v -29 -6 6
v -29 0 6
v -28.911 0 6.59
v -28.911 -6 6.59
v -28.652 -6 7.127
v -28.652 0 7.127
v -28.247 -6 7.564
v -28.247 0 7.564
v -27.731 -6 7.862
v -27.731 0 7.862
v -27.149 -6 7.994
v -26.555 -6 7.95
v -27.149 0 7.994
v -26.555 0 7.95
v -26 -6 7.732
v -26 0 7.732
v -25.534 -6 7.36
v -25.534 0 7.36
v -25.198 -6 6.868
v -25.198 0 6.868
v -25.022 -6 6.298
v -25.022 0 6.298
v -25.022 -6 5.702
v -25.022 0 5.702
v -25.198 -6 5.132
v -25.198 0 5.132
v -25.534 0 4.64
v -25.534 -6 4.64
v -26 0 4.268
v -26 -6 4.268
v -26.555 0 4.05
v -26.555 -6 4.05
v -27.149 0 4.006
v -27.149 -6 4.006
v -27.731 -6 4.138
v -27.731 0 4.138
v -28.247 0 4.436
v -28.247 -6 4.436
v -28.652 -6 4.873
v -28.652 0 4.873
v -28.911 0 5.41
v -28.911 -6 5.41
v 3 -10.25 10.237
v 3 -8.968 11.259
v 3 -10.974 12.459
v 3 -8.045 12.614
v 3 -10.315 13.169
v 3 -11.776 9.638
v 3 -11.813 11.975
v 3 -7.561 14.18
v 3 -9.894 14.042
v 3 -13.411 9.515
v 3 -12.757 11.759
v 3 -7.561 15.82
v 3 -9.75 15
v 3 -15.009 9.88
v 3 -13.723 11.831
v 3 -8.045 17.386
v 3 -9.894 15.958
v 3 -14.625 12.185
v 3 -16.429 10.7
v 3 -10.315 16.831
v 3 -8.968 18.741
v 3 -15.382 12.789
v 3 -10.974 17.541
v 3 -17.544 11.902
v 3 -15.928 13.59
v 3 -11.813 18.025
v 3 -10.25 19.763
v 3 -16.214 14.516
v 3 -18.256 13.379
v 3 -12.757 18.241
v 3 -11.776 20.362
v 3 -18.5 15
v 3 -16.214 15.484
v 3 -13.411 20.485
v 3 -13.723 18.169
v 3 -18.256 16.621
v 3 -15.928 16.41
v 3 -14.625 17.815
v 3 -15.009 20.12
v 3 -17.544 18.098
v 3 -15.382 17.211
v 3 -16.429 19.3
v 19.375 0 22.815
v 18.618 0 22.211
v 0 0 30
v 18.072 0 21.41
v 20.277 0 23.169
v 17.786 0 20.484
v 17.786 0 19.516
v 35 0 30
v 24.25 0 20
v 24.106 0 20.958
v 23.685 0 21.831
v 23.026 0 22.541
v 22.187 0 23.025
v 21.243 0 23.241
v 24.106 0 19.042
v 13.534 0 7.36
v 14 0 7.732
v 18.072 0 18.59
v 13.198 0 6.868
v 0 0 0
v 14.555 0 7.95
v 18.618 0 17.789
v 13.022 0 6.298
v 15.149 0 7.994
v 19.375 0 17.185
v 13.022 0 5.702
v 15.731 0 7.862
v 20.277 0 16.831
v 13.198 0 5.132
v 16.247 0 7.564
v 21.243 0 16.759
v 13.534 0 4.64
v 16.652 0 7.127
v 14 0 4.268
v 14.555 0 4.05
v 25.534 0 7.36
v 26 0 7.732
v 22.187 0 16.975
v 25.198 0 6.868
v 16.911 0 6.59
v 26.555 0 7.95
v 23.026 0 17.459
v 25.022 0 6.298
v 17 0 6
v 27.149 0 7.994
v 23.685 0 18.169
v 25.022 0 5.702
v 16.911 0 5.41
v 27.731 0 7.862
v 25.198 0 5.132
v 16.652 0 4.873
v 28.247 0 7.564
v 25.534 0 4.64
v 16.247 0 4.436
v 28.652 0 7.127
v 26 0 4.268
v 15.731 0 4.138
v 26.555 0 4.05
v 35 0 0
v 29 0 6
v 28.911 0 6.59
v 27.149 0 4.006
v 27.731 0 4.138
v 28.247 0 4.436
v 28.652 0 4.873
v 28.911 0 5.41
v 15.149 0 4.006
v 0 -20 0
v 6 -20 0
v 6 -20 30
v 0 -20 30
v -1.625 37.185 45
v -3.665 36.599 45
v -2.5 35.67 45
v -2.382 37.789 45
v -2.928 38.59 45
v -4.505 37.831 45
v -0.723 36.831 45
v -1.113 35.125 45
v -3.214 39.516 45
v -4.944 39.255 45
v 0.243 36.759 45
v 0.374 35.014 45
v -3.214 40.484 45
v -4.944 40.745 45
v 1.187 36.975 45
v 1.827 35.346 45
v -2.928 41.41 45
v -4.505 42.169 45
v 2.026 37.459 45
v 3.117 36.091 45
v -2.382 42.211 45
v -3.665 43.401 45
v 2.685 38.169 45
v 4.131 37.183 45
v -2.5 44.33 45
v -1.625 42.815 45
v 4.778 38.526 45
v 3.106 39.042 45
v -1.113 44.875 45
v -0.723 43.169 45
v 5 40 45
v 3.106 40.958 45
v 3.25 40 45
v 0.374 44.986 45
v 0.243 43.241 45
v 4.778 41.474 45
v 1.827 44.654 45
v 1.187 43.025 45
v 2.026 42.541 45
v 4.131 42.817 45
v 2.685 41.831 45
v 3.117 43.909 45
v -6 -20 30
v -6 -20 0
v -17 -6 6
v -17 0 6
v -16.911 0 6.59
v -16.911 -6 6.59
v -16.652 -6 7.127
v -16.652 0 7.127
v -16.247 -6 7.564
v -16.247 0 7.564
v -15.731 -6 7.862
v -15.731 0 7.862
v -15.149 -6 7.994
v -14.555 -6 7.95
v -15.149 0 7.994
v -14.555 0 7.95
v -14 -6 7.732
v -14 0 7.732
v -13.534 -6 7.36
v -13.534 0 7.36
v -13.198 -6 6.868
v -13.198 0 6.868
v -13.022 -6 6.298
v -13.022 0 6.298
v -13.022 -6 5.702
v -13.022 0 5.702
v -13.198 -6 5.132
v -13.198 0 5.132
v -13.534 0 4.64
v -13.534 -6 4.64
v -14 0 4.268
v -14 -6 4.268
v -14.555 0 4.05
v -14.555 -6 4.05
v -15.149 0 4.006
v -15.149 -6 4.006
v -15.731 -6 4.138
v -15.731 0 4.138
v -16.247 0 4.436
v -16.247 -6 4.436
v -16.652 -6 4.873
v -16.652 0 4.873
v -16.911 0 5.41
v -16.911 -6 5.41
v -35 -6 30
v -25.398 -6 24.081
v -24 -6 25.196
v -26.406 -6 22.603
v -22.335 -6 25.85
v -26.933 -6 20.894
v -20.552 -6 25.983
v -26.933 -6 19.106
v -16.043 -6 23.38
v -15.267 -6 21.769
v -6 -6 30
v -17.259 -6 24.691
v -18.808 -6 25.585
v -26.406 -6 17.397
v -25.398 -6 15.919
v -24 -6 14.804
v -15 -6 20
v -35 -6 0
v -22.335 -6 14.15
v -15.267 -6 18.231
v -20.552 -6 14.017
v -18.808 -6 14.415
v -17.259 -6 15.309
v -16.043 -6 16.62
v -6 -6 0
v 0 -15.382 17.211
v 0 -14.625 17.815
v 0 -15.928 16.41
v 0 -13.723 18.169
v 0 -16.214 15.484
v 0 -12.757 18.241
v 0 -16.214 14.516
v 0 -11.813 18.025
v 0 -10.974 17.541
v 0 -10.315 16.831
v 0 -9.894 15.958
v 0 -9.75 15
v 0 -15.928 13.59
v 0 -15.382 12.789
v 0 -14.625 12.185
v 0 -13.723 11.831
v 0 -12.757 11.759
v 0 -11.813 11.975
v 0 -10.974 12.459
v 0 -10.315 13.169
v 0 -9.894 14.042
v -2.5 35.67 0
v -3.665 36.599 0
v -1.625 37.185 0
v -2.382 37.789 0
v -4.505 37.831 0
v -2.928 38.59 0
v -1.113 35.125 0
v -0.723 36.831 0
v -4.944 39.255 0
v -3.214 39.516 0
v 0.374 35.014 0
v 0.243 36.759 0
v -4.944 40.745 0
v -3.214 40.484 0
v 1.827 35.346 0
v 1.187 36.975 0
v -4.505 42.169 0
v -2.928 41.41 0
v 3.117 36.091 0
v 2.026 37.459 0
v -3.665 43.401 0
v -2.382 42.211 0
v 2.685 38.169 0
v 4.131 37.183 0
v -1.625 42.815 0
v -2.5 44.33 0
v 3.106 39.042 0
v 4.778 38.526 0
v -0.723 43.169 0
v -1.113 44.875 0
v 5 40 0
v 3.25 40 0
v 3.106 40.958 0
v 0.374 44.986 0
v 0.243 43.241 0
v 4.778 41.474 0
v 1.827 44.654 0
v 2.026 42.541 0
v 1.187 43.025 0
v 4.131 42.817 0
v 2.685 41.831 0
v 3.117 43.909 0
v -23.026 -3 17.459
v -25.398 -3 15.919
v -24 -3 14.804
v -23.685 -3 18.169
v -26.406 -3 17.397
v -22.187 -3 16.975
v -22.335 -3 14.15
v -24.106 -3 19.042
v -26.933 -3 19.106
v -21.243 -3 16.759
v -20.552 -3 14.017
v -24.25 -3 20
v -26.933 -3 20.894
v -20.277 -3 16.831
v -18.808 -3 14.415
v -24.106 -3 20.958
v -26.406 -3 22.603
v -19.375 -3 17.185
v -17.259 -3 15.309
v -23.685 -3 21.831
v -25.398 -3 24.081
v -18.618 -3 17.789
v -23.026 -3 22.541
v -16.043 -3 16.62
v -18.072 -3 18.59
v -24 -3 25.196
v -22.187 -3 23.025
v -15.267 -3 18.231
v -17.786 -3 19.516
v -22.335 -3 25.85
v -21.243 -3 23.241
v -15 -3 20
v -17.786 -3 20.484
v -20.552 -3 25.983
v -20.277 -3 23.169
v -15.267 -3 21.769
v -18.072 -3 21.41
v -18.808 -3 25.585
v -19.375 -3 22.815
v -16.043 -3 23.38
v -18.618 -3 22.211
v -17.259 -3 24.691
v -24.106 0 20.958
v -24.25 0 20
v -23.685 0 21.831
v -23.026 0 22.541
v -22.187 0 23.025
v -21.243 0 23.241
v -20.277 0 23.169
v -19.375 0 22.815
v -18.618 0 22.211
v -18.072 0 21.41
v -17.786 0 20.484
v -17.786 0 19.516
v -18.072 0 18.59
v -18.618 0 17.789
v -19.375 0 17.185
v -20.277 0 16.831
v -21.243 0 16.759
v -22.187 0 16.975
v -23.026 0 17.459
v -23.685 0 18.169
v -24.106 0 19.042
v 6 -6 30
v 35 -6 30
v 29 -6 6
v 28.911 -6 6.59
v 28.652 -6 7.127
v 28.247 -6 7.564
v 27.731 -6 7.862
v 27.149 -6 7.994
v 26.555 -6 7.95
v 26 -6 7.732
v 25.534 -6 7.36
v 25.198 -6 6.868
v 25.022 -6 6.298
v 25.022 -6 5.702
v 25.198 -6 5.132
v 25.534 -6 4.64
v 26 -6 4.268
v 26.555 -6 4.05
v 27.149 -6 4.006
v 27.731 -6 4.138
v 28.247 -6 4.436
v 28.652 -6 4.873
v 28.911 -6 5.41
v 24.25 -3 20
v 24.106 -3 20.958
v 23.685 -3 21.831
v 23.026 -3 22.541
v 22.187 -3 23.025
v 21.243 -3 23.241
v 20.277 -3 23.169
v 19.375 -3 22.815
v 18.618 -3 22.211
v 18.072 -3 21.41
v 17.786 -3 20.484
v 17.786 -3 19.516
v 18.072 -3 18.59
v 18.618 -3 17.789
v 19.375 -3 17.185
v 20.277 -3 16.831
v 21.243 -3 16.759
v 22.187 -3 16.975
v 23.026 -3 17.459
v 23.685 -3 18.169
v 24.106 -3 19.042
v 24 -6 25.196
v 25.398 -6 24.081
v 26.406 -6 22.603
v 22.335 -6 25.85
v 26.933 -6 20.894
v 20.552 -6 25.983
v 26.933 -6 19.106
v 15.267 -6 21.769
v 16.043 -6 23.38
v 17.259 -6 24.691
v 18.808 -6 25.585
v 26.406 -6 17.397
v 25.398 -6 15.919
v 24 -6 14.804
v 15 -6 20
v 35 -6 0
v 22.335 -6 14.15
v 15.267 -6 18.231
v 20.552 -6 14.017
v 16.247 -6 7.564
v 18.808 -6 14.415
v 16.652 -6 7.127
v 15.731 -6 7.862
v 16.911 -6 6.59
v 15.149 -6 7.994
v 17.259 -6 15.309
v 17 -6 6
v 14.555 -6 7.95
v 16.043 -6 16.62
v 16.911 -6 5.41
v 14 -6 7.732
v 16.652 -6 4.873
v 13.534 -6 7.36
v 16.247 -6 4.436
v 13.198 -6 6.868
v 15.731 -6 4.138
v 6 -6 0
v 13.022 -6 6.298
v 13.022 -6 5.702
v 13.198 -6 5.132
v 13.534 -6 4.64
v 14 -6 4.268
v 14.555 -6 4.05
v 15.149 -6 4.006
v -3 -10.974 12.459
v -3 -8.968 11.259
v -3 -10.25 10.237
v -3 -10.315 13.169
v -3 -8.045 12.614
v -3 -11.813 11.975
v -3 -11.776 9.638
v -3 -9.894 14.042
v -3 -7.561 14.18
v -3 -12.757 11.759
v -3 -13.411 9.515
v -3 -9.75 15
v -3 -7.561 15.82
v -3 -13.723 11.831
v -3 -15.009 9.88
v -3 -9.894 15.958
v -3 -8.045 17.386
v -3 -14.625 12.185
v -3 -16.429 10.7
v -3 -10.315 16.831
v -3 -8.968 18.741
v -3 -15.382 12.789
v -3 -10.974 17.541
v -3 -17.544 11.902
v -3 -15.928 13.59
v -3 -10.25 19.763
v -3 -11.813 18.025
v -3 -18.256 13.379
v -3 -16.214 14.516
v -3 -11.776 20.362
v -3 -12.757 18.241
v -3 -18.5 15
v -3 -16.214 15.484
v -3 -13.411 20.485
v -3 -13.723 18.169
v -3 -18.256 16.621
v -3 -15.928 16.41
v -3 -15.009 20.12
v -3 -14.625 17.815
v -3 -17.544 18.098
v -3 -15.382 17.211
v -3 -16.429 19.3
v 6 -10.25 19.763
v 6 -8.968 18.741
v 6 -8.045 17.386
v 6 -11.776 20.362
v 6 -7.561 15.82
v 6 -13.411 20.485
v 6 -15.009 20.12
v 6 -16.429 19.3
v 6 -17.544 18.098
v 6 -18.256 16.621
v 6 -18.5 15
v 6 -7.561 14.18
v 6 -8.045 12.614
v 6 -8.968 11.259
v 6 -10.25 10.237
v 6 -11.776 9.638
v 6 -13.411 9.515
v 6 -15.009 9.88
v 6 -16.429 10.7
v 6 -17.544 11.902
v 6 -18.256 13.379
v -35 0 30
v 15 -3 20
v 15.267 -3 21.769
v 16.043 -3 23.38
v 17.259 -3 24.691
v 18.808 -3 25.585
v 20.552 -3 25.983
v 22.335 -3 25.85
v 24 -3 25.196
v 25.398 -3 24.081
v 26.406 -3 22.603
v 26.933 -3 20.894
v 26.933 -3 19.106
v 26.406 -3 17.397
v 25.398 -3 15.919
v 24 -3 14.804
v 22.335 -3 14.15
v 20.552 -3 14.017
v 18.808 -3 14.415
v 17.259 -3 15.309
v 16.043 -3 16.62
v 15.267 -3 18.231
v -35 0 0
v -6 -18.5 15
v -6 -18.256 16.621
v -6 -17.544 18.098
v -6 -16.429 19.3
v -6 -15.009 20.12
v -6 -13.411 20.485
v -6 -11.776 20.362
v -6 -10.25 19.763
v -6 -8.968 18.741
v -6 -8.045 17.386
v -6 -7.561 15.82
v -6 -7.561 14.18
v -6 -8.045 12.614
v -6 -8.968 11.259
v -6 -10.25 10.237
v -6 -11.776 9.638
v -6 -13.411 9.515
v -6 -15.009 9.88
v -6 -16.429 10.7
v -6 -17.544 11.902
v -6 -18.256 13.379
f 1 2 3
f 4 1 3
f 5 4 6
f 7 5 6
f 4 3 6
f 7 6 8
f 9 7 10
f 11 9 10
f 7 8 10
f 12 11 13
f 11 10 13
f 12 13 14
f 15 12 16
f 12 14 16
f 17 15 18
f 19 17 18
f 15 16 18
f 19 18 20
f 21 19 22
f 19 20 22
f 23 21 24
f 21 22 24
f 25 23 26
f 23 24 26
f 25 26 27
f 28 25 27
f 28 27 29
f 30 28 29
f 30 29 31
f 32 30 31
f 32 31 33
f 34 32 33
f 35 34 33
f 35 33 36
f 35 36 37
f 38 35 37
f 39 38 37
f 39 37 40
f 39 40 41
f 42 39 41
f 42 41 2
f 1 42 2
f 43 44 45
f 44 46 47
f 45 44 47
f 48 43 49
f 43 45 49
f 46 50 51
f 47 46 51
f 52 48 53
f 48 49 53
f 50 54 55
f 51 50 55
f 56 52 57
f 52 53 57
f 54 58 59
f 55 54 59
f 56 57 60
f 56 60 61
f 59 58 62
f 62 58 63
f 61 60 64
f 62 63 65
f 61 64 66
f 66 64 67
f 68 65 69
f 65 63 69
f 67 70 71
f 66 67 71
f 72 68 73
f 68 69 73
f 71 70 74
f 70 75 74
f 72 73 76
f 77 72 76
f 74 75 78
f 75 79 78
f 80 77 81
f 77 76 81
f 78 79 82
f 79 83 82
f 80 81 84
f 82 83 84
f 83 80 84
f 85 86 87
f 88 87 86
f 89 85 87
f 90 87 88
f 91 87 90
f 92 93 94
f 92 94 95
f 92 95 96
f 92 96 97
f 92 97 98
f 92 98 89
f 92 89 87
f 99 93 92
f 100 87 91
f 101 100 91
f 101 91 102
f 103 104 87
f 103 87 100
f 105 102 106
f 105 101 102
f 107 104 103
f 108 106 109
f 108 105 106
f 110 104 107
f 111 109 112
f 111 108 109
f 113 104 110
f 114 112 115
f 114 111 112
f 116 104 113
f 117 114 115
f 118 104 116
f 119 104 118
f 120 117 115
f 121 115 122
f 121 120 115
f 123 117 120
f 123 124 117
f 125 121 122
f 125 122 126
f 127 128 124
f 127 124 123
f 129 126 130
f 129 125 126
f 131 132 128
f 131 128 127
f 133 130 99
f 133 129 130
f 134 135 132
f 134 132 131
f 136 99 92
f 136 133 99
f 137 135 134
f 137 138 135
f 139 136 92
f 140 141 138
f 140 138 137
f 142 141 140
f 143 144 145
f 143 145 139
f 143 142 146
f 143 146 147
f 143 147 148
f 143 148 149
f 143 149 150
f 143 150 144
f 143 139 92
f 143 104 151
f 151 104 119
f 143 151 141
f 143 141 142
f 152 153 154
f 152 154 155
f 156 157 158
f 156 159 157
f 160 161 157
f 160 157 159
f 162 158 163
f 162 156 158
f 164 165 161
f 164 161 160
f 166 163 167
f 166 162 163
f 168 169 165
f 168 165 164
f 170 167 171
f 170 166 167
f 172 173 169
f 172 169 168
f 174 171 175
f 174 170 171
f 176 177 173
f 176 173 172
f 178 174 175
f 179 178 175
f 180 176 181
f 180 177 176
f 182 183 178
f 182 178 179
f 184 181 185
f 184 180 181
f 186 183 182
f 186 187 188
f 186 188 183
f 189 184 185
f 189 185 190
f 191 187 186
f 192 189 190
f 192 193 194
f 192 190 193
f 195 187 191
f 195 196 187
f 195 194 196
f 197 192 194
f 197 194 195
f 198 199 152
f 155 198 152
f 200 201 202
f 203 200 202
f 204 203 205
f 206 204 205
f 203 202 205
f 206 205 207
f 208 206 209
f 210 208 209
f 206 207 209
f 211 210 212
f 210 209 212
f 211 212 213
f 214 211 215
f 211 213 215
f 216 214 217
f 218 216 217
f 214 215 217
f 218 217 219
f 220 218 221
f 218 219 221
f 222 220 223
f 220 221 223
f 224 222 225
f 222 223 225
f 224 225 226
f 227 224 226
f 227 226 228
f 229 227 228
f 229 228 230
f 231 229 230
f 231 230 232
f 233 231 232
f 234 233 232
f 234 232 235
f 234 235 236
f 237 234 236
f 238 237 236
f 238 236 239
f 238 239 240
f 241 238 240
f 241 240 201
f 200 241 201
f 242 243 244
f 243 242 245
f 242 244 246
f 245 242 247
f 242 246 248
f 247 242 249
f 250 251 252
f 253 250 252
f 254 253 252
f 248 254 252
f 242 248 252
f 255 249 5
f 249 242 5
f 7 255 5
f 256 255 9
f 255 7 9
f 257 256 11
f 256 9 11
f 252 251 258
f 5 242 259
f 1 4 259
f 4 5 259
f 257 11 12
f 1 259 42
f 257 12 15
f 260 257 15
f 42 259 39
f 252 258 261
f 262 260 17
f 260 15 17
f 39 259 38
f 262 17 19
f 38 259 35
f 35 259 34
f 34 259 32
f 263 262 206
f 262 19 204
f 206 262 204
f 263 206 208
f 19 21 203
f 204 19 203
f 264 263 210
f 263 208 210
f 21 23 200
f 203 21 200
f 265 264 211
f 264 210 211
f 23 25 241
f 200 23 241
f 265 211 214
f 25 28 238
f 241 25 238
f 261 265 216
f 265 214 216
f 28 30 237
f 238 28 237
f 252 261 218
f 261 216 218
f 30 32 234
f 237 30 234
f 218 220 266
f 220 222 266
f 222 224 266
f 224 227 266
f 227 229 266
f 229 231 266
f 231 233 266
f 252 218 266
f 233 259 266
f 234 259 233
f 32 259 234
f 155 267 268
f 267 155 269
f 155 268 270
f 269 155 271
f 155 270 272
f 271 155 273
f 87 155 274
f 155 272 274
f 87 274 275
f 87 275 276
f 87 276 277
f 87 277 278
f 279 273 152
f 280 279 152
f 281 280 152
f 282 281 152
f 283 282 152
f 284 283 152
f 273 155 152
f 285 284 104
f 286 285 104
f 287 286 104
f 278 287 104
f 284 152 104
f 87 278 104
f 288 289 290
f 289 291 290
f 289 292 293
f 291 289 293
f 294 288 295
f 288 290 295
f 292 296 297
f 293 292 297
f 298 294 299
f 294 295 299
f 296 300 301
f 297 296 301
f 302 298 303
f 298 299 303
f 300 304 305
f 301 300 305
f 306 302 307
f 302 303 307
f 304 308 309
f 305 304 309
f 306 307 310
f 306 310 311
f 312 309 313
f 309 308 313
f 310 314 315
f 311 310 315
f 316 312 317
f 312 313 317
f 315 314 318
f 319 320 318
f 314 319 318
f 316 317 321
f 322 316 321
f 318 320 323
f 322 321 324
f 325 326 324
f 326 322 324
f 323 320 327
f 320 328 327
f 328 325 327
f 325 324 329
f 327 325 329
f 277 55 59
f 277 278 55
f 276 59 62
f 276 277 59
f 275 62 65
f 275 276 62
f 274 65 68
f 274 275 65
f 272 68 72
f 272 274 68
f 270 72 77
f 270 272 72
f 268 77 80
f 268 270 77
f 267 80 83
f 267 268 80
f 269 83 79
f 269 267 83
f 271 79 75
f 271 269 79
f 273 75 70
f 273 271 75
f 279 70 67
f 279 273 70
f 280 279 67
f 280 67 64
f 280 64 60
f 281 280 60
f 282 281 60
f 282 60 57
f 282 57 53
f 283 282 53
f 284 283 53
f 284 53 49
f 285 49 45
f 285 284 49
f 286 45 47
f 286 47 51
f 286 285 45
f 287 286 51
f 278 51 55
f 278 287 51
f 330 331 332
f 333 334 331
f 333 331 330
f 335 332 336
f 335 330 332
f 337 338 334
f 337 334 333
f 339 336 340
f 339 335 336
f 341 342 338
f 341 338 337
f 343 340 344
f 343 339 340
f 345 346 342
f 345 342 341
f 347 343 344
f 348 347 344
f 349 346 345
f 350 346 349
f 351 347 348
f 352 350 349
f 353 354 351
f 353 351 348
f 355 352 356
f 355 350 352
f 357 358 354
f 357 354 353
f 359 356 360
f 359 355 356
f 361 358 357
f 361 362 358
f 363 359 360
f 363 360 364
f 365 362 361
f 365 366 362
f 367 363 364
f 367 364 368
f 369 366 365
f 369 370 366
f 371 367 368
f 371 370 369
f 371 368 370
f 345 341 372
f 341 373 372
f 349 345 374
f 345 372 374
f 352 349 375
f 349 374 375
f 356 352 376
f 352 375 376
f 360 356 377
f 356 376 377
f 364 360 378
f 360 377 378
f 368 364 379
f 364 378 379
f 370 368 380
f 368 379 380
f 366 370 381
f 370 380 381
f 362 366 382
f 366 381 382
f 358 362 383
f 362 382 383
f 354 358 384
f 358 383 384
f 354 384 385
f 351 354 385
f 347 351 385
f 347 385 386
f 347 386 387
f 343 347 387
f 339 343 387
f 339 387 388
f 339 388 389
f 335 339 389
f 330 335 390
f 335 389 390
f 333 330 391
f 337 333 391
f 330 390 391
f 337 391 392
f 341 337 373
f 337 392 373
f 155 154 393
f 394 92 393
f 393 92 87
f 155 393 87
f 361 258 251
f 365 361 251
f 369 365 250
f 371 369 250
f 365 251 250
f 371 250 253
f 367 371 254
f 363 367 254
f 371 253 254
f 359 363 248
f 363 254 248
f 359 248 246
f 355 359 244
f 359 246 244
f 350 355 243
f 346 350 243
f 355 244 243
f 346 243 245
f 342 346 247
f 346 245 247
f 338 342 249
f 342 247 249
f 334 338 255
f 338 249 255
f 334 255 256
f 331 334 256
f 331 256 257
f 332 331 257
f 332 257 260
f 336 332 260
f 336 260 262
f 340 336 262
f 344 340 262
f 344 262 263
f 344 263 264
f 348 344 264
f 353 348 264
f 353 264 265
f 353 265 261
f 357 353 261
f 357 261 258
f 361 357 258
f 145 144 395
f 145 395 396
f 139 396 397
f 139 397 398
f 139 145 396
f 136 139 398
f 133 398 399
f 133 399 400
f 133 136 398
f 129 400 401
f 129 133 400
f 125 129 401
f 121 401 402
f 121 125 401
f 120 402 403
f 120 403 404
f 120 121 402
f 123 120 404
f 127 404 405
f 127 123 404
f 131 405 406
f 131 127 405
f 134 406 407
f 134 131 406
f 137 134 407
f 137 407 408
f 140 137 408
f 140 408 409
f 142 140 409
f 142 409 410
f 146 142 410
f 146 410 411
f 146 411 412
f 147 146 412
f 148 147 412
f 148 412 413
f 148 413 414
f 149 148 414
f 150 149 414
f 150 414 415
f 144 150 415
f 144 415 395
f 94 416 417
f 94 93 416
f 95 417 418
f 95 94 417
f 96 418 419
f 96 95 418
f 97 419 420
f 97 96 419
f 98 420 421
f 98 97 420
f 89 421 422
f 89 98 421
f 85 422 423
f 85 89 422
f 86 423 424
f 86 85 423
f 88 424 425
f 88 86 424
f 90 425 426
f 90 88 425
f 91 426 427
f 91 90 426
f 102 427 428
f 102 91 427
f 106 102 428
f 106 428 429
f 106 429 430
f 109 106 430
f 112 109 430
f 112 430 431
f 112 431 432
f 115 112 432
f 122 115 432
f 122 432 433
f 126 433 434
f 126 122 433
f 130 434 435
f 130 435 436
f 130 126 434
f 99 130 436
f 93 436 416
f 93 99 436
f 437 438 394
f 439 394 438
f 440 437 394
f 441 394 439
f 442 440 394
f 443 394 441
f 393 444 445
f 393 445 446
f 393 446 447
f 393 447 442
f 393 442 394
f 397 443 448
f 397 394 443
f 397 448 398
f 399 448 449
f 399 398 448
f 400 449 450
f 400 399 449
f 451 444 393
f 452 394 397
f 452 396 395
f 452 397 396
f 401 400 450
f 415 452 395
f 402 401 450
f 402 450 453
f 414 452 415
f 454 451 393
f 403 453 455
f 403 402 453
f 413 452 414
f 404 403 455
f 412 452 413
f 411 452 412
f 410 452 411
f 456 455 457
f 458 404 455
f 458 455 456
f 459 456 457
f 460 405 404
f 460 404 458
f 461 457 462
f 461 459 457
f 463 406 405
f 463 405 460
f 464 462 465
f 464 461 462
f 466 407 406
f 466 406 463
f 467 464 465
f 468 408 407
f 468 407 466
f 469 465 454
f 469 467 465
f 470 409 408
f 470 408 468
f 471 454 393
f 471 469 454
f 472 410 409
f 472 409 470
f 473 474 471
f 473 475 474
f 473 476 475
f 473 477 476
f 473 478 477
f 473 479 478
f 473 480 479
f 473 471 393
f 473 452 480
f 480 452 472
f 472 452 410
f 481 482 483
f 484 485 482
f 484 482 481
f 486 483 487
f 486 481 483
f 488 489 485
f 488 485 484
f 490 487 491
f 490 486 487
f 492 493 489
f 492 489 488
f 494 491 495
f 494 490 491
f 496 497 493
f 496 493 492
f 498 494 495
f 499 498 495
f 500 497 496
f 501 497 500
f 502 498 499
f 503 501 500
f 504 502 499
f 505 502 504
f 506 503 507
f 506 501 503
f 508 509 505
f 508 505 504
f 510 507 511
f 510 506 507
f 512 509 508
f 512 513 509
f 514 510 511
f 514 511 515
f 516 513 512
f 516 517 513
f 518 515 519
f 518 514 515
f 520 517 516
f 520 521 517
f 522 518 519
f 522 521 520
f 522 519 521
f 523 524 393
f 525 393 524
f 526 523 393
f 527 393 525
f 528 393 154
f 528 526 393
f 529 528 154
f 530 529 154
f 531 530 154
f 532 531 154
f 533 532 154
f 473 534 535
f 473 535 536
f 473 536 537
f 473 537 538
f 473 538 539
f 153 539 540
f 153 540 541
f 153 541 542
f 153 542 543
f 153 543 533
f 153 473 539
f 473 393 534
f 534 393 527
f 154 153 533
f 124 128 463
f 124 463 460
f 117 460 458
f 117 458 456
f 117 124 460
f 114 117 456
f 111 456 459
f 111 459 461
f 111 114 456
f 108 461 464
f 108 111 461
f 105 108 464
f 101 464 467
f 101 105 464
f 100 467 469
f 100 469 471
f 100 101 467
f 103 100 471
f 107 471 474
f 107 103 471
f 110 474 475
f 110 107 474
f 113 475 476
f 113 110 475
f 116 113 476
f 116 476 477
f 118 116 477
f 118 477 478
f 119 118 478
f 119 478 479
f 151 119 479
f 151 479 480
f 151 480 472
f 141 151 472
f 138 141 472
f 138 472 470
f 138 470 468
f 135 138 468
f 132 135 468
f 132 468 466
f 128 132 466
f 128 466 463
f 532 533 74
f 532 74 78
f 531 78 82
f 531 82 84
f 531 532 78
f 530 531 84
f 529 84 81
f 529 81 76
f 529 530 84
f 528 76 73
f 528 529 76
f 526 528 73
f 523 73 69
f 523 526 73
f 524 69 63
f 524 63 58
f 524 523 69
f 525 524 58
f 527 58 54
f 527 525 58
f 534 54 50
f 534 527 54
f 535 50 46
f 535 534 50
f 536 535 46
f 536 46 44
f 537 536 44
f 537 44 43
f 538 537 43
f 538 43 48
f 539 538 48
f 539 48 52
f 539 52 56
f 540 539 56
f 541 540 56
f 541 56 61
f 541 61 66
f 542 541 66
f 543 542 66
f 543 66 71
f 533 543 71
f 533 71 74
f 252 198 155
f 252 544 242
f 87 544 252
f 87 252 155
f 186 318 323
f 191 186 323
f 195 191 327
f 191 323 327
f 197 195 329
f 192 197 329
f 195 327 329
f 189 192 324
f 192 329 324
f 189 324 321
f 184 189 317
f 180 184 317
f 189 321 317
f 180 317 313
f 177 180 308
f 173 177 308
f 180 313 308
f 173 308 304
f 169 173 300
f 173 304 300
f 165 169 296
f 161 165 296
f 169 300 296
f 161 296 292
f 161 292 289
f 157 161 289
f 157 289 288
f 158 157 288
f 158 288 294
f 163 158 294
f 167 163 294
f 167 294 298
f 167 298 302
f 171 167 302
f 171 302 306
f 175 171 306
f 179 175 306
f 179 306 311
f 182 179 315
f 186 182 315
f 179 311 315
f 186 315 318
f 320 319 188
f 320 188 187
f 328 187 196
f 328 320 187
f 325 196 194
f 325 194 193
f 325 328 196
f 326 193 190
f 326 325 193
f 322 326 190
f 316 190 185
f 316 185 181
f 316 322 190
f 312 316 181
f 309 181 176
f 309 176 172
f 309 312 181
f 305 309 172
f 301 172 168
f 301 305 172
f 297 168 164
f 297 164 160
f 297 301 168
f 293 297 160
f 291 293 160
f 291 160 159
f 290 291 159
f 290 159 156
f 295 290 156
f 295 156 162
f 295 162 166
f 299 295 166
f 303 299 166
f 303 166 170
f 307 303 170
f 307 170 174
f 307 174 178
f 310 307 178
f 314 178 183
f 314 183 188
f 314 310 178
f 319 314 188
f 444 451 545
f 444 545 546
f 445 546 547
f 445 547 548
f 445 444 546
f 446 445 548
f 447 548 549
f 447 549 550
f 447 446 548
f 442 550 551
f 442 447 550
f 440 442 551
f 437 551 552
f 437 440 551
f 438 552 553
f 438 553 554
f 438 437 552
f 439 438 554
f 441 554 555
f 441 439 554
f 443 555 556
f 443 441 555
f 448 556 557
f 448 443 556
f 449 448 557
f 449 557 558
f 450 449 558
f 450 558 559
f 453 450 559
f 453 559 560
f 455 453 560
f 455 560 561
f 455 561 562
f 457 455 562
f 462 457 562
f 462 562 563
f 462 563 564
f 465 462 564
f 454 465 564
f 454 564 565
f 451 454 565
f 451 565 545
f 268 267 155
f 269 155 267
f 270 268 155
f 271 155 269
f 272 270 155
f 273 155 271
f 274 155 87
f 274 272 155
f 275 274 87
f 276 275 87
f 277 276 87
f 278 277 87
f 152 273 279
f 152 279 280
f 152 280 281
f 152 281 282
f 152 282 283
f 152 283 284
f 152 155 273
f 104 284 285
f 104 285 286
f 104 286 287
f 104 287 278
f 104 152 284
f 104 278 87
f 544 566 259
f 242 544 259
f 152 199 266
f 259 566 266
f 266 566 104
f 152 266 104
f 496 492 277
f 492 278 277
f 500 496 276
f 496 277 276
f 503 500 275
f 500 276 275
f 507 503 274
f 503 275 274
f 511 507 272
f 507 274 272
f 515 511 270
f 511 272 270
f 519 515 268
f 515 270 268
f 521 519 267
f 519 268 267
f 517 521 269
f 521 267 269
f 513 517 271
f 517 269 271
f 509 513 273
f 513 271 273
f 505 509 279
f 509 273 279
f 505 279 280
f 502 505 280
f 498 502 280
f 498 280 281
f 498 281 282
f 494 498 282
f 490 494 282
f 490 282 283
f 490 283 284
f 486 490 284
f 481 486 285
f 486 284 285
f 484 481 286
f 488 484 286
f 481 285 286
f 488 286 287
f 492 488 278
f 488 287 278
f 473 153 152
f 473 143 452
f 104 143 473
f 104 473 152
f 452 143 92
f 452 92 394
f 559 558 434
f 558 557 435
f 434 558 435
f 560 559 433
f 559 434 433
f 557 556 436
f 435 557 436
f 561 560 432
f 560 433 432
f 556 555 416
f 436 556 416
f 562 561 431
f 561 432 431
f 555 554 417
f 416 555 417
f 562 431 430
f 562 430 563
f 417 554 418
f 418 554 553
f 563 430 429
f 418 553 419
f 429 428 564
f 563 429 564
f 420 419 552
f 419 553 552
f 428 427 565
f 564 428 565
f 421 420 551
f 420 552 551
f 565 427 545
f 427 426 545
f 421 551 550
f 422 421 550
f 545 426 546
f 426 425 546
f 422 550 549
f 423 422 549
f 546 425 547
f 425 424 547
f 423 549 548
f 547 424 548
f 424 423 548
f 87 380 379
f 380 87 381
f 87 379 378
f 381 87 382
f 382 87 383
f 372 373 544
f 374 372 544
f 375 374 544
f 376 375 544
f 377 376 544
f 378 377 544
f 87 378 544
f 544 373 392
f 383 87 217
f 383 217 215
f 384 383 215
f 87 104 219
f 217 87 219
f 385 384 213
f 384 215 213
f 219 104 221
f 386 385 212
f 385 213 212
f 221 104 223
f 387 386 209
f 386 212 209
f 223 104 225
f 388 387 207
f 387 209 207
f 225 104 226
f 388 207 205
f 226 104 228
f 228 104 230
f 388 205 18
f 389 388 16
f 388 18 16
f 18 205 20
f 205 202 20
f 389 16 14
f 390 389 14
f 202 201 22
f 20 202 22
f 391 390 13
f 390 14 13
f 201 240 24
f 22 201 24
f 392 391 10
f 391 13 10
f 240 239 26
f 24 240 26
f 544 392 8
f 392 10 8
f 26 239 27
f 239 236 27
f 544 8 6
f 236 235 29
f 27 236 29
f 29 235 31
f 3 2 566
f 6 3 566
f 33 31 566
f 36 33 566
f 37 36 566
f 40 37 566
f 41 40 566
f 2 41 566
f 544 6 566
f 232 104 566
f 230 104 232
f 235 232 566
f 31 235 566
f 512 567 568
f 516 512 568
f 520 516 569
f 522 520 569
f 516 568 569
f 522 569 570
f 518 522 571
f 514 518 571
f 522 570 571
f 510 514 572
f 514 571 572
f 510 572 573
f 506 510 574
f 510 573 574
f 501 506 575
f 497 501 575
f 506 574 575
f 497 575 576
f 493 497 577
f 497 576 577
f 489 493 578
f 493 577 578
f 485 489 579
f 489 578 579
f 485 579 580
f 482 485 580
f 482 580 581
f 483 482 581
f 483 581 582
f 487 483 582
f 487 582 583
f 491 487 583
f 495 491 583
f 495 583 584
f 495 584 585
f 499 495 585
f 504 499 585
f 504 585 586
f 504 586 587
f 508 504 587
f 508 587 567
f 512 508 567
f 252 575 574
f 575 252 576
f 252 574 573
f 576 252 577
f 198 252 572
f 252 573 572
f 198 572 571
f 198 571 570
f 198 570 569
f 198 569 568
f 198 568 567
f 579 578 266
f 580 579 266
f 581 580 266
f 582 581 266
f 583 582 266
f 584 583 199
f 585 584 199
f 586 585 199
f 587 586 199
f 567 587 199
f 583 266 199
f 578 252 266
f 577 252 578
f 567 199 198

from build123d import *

# Parameters (mm, degrees)
F1_DEPTH       = 30
F3_D           = 6.5
F3_CBORE_D     = 12
F3_CBORE_DEPTH = 3
F4_D           = 4
F6_D           = 6.5
F6_CBORE_D     = 11
F6_CBORE_DEPTH = 3
F0_R           = 5
F0_R_2         = 3.25
F8_DEPTH       = 45


with BuildPart() as f1:
    # F0 (on Top) → F1 (new body)
    with BuildSketch(Plane.XY):
        Polygon((-6, -20), (0, -20), (0, 0), (-35, 0), (-35, -6), (-6, -6), align=None)
    extrude(amount=F1_DEPTH)

    # F3 (through all)
    with Locations(Plane.XZ.offset(6)):
        with Locations((-21, 20)):
            CounterBoreHole(F3_D / 2, F3_CBORE_D / 2, F3_CBORE_DEPTH)

    # F4 (through all)
    with Locations(Plane.XZ.offset(6)):
        with Locations((-27, 6), (-15, 6)):
            Hole(F4_D / 2)

    # F6 (through all)
    with Locations(Plane(origin=(-6, 0, 0), x_dir=(0, -1, 0), z_dir=(-1, 0, 0))):
        with Locations((13, 15)):
            CounterBoreHole(F6_D / 2, F6_CBORE_D / 2, F6_CBORE_DEPTH)


with BuildPart() as f7_1:
    # F7: instance of F1
    add(f1.part.mirror(Plane.YZ))


with BuildPart() as f8:
    # F0 (on Top) → F8 (new body)
    with BuildSketch(Plane.XY):
        with Locations((0, 40)):
            Circle(F0_R)
        with Locations((0, 40)):
            Circle(F0_R_2, mode=Mode.SUBTRACT)
    extrude(amount=F8_DEPTH)


solid = Compound([f1.part, f7_1.part, f8.part])
